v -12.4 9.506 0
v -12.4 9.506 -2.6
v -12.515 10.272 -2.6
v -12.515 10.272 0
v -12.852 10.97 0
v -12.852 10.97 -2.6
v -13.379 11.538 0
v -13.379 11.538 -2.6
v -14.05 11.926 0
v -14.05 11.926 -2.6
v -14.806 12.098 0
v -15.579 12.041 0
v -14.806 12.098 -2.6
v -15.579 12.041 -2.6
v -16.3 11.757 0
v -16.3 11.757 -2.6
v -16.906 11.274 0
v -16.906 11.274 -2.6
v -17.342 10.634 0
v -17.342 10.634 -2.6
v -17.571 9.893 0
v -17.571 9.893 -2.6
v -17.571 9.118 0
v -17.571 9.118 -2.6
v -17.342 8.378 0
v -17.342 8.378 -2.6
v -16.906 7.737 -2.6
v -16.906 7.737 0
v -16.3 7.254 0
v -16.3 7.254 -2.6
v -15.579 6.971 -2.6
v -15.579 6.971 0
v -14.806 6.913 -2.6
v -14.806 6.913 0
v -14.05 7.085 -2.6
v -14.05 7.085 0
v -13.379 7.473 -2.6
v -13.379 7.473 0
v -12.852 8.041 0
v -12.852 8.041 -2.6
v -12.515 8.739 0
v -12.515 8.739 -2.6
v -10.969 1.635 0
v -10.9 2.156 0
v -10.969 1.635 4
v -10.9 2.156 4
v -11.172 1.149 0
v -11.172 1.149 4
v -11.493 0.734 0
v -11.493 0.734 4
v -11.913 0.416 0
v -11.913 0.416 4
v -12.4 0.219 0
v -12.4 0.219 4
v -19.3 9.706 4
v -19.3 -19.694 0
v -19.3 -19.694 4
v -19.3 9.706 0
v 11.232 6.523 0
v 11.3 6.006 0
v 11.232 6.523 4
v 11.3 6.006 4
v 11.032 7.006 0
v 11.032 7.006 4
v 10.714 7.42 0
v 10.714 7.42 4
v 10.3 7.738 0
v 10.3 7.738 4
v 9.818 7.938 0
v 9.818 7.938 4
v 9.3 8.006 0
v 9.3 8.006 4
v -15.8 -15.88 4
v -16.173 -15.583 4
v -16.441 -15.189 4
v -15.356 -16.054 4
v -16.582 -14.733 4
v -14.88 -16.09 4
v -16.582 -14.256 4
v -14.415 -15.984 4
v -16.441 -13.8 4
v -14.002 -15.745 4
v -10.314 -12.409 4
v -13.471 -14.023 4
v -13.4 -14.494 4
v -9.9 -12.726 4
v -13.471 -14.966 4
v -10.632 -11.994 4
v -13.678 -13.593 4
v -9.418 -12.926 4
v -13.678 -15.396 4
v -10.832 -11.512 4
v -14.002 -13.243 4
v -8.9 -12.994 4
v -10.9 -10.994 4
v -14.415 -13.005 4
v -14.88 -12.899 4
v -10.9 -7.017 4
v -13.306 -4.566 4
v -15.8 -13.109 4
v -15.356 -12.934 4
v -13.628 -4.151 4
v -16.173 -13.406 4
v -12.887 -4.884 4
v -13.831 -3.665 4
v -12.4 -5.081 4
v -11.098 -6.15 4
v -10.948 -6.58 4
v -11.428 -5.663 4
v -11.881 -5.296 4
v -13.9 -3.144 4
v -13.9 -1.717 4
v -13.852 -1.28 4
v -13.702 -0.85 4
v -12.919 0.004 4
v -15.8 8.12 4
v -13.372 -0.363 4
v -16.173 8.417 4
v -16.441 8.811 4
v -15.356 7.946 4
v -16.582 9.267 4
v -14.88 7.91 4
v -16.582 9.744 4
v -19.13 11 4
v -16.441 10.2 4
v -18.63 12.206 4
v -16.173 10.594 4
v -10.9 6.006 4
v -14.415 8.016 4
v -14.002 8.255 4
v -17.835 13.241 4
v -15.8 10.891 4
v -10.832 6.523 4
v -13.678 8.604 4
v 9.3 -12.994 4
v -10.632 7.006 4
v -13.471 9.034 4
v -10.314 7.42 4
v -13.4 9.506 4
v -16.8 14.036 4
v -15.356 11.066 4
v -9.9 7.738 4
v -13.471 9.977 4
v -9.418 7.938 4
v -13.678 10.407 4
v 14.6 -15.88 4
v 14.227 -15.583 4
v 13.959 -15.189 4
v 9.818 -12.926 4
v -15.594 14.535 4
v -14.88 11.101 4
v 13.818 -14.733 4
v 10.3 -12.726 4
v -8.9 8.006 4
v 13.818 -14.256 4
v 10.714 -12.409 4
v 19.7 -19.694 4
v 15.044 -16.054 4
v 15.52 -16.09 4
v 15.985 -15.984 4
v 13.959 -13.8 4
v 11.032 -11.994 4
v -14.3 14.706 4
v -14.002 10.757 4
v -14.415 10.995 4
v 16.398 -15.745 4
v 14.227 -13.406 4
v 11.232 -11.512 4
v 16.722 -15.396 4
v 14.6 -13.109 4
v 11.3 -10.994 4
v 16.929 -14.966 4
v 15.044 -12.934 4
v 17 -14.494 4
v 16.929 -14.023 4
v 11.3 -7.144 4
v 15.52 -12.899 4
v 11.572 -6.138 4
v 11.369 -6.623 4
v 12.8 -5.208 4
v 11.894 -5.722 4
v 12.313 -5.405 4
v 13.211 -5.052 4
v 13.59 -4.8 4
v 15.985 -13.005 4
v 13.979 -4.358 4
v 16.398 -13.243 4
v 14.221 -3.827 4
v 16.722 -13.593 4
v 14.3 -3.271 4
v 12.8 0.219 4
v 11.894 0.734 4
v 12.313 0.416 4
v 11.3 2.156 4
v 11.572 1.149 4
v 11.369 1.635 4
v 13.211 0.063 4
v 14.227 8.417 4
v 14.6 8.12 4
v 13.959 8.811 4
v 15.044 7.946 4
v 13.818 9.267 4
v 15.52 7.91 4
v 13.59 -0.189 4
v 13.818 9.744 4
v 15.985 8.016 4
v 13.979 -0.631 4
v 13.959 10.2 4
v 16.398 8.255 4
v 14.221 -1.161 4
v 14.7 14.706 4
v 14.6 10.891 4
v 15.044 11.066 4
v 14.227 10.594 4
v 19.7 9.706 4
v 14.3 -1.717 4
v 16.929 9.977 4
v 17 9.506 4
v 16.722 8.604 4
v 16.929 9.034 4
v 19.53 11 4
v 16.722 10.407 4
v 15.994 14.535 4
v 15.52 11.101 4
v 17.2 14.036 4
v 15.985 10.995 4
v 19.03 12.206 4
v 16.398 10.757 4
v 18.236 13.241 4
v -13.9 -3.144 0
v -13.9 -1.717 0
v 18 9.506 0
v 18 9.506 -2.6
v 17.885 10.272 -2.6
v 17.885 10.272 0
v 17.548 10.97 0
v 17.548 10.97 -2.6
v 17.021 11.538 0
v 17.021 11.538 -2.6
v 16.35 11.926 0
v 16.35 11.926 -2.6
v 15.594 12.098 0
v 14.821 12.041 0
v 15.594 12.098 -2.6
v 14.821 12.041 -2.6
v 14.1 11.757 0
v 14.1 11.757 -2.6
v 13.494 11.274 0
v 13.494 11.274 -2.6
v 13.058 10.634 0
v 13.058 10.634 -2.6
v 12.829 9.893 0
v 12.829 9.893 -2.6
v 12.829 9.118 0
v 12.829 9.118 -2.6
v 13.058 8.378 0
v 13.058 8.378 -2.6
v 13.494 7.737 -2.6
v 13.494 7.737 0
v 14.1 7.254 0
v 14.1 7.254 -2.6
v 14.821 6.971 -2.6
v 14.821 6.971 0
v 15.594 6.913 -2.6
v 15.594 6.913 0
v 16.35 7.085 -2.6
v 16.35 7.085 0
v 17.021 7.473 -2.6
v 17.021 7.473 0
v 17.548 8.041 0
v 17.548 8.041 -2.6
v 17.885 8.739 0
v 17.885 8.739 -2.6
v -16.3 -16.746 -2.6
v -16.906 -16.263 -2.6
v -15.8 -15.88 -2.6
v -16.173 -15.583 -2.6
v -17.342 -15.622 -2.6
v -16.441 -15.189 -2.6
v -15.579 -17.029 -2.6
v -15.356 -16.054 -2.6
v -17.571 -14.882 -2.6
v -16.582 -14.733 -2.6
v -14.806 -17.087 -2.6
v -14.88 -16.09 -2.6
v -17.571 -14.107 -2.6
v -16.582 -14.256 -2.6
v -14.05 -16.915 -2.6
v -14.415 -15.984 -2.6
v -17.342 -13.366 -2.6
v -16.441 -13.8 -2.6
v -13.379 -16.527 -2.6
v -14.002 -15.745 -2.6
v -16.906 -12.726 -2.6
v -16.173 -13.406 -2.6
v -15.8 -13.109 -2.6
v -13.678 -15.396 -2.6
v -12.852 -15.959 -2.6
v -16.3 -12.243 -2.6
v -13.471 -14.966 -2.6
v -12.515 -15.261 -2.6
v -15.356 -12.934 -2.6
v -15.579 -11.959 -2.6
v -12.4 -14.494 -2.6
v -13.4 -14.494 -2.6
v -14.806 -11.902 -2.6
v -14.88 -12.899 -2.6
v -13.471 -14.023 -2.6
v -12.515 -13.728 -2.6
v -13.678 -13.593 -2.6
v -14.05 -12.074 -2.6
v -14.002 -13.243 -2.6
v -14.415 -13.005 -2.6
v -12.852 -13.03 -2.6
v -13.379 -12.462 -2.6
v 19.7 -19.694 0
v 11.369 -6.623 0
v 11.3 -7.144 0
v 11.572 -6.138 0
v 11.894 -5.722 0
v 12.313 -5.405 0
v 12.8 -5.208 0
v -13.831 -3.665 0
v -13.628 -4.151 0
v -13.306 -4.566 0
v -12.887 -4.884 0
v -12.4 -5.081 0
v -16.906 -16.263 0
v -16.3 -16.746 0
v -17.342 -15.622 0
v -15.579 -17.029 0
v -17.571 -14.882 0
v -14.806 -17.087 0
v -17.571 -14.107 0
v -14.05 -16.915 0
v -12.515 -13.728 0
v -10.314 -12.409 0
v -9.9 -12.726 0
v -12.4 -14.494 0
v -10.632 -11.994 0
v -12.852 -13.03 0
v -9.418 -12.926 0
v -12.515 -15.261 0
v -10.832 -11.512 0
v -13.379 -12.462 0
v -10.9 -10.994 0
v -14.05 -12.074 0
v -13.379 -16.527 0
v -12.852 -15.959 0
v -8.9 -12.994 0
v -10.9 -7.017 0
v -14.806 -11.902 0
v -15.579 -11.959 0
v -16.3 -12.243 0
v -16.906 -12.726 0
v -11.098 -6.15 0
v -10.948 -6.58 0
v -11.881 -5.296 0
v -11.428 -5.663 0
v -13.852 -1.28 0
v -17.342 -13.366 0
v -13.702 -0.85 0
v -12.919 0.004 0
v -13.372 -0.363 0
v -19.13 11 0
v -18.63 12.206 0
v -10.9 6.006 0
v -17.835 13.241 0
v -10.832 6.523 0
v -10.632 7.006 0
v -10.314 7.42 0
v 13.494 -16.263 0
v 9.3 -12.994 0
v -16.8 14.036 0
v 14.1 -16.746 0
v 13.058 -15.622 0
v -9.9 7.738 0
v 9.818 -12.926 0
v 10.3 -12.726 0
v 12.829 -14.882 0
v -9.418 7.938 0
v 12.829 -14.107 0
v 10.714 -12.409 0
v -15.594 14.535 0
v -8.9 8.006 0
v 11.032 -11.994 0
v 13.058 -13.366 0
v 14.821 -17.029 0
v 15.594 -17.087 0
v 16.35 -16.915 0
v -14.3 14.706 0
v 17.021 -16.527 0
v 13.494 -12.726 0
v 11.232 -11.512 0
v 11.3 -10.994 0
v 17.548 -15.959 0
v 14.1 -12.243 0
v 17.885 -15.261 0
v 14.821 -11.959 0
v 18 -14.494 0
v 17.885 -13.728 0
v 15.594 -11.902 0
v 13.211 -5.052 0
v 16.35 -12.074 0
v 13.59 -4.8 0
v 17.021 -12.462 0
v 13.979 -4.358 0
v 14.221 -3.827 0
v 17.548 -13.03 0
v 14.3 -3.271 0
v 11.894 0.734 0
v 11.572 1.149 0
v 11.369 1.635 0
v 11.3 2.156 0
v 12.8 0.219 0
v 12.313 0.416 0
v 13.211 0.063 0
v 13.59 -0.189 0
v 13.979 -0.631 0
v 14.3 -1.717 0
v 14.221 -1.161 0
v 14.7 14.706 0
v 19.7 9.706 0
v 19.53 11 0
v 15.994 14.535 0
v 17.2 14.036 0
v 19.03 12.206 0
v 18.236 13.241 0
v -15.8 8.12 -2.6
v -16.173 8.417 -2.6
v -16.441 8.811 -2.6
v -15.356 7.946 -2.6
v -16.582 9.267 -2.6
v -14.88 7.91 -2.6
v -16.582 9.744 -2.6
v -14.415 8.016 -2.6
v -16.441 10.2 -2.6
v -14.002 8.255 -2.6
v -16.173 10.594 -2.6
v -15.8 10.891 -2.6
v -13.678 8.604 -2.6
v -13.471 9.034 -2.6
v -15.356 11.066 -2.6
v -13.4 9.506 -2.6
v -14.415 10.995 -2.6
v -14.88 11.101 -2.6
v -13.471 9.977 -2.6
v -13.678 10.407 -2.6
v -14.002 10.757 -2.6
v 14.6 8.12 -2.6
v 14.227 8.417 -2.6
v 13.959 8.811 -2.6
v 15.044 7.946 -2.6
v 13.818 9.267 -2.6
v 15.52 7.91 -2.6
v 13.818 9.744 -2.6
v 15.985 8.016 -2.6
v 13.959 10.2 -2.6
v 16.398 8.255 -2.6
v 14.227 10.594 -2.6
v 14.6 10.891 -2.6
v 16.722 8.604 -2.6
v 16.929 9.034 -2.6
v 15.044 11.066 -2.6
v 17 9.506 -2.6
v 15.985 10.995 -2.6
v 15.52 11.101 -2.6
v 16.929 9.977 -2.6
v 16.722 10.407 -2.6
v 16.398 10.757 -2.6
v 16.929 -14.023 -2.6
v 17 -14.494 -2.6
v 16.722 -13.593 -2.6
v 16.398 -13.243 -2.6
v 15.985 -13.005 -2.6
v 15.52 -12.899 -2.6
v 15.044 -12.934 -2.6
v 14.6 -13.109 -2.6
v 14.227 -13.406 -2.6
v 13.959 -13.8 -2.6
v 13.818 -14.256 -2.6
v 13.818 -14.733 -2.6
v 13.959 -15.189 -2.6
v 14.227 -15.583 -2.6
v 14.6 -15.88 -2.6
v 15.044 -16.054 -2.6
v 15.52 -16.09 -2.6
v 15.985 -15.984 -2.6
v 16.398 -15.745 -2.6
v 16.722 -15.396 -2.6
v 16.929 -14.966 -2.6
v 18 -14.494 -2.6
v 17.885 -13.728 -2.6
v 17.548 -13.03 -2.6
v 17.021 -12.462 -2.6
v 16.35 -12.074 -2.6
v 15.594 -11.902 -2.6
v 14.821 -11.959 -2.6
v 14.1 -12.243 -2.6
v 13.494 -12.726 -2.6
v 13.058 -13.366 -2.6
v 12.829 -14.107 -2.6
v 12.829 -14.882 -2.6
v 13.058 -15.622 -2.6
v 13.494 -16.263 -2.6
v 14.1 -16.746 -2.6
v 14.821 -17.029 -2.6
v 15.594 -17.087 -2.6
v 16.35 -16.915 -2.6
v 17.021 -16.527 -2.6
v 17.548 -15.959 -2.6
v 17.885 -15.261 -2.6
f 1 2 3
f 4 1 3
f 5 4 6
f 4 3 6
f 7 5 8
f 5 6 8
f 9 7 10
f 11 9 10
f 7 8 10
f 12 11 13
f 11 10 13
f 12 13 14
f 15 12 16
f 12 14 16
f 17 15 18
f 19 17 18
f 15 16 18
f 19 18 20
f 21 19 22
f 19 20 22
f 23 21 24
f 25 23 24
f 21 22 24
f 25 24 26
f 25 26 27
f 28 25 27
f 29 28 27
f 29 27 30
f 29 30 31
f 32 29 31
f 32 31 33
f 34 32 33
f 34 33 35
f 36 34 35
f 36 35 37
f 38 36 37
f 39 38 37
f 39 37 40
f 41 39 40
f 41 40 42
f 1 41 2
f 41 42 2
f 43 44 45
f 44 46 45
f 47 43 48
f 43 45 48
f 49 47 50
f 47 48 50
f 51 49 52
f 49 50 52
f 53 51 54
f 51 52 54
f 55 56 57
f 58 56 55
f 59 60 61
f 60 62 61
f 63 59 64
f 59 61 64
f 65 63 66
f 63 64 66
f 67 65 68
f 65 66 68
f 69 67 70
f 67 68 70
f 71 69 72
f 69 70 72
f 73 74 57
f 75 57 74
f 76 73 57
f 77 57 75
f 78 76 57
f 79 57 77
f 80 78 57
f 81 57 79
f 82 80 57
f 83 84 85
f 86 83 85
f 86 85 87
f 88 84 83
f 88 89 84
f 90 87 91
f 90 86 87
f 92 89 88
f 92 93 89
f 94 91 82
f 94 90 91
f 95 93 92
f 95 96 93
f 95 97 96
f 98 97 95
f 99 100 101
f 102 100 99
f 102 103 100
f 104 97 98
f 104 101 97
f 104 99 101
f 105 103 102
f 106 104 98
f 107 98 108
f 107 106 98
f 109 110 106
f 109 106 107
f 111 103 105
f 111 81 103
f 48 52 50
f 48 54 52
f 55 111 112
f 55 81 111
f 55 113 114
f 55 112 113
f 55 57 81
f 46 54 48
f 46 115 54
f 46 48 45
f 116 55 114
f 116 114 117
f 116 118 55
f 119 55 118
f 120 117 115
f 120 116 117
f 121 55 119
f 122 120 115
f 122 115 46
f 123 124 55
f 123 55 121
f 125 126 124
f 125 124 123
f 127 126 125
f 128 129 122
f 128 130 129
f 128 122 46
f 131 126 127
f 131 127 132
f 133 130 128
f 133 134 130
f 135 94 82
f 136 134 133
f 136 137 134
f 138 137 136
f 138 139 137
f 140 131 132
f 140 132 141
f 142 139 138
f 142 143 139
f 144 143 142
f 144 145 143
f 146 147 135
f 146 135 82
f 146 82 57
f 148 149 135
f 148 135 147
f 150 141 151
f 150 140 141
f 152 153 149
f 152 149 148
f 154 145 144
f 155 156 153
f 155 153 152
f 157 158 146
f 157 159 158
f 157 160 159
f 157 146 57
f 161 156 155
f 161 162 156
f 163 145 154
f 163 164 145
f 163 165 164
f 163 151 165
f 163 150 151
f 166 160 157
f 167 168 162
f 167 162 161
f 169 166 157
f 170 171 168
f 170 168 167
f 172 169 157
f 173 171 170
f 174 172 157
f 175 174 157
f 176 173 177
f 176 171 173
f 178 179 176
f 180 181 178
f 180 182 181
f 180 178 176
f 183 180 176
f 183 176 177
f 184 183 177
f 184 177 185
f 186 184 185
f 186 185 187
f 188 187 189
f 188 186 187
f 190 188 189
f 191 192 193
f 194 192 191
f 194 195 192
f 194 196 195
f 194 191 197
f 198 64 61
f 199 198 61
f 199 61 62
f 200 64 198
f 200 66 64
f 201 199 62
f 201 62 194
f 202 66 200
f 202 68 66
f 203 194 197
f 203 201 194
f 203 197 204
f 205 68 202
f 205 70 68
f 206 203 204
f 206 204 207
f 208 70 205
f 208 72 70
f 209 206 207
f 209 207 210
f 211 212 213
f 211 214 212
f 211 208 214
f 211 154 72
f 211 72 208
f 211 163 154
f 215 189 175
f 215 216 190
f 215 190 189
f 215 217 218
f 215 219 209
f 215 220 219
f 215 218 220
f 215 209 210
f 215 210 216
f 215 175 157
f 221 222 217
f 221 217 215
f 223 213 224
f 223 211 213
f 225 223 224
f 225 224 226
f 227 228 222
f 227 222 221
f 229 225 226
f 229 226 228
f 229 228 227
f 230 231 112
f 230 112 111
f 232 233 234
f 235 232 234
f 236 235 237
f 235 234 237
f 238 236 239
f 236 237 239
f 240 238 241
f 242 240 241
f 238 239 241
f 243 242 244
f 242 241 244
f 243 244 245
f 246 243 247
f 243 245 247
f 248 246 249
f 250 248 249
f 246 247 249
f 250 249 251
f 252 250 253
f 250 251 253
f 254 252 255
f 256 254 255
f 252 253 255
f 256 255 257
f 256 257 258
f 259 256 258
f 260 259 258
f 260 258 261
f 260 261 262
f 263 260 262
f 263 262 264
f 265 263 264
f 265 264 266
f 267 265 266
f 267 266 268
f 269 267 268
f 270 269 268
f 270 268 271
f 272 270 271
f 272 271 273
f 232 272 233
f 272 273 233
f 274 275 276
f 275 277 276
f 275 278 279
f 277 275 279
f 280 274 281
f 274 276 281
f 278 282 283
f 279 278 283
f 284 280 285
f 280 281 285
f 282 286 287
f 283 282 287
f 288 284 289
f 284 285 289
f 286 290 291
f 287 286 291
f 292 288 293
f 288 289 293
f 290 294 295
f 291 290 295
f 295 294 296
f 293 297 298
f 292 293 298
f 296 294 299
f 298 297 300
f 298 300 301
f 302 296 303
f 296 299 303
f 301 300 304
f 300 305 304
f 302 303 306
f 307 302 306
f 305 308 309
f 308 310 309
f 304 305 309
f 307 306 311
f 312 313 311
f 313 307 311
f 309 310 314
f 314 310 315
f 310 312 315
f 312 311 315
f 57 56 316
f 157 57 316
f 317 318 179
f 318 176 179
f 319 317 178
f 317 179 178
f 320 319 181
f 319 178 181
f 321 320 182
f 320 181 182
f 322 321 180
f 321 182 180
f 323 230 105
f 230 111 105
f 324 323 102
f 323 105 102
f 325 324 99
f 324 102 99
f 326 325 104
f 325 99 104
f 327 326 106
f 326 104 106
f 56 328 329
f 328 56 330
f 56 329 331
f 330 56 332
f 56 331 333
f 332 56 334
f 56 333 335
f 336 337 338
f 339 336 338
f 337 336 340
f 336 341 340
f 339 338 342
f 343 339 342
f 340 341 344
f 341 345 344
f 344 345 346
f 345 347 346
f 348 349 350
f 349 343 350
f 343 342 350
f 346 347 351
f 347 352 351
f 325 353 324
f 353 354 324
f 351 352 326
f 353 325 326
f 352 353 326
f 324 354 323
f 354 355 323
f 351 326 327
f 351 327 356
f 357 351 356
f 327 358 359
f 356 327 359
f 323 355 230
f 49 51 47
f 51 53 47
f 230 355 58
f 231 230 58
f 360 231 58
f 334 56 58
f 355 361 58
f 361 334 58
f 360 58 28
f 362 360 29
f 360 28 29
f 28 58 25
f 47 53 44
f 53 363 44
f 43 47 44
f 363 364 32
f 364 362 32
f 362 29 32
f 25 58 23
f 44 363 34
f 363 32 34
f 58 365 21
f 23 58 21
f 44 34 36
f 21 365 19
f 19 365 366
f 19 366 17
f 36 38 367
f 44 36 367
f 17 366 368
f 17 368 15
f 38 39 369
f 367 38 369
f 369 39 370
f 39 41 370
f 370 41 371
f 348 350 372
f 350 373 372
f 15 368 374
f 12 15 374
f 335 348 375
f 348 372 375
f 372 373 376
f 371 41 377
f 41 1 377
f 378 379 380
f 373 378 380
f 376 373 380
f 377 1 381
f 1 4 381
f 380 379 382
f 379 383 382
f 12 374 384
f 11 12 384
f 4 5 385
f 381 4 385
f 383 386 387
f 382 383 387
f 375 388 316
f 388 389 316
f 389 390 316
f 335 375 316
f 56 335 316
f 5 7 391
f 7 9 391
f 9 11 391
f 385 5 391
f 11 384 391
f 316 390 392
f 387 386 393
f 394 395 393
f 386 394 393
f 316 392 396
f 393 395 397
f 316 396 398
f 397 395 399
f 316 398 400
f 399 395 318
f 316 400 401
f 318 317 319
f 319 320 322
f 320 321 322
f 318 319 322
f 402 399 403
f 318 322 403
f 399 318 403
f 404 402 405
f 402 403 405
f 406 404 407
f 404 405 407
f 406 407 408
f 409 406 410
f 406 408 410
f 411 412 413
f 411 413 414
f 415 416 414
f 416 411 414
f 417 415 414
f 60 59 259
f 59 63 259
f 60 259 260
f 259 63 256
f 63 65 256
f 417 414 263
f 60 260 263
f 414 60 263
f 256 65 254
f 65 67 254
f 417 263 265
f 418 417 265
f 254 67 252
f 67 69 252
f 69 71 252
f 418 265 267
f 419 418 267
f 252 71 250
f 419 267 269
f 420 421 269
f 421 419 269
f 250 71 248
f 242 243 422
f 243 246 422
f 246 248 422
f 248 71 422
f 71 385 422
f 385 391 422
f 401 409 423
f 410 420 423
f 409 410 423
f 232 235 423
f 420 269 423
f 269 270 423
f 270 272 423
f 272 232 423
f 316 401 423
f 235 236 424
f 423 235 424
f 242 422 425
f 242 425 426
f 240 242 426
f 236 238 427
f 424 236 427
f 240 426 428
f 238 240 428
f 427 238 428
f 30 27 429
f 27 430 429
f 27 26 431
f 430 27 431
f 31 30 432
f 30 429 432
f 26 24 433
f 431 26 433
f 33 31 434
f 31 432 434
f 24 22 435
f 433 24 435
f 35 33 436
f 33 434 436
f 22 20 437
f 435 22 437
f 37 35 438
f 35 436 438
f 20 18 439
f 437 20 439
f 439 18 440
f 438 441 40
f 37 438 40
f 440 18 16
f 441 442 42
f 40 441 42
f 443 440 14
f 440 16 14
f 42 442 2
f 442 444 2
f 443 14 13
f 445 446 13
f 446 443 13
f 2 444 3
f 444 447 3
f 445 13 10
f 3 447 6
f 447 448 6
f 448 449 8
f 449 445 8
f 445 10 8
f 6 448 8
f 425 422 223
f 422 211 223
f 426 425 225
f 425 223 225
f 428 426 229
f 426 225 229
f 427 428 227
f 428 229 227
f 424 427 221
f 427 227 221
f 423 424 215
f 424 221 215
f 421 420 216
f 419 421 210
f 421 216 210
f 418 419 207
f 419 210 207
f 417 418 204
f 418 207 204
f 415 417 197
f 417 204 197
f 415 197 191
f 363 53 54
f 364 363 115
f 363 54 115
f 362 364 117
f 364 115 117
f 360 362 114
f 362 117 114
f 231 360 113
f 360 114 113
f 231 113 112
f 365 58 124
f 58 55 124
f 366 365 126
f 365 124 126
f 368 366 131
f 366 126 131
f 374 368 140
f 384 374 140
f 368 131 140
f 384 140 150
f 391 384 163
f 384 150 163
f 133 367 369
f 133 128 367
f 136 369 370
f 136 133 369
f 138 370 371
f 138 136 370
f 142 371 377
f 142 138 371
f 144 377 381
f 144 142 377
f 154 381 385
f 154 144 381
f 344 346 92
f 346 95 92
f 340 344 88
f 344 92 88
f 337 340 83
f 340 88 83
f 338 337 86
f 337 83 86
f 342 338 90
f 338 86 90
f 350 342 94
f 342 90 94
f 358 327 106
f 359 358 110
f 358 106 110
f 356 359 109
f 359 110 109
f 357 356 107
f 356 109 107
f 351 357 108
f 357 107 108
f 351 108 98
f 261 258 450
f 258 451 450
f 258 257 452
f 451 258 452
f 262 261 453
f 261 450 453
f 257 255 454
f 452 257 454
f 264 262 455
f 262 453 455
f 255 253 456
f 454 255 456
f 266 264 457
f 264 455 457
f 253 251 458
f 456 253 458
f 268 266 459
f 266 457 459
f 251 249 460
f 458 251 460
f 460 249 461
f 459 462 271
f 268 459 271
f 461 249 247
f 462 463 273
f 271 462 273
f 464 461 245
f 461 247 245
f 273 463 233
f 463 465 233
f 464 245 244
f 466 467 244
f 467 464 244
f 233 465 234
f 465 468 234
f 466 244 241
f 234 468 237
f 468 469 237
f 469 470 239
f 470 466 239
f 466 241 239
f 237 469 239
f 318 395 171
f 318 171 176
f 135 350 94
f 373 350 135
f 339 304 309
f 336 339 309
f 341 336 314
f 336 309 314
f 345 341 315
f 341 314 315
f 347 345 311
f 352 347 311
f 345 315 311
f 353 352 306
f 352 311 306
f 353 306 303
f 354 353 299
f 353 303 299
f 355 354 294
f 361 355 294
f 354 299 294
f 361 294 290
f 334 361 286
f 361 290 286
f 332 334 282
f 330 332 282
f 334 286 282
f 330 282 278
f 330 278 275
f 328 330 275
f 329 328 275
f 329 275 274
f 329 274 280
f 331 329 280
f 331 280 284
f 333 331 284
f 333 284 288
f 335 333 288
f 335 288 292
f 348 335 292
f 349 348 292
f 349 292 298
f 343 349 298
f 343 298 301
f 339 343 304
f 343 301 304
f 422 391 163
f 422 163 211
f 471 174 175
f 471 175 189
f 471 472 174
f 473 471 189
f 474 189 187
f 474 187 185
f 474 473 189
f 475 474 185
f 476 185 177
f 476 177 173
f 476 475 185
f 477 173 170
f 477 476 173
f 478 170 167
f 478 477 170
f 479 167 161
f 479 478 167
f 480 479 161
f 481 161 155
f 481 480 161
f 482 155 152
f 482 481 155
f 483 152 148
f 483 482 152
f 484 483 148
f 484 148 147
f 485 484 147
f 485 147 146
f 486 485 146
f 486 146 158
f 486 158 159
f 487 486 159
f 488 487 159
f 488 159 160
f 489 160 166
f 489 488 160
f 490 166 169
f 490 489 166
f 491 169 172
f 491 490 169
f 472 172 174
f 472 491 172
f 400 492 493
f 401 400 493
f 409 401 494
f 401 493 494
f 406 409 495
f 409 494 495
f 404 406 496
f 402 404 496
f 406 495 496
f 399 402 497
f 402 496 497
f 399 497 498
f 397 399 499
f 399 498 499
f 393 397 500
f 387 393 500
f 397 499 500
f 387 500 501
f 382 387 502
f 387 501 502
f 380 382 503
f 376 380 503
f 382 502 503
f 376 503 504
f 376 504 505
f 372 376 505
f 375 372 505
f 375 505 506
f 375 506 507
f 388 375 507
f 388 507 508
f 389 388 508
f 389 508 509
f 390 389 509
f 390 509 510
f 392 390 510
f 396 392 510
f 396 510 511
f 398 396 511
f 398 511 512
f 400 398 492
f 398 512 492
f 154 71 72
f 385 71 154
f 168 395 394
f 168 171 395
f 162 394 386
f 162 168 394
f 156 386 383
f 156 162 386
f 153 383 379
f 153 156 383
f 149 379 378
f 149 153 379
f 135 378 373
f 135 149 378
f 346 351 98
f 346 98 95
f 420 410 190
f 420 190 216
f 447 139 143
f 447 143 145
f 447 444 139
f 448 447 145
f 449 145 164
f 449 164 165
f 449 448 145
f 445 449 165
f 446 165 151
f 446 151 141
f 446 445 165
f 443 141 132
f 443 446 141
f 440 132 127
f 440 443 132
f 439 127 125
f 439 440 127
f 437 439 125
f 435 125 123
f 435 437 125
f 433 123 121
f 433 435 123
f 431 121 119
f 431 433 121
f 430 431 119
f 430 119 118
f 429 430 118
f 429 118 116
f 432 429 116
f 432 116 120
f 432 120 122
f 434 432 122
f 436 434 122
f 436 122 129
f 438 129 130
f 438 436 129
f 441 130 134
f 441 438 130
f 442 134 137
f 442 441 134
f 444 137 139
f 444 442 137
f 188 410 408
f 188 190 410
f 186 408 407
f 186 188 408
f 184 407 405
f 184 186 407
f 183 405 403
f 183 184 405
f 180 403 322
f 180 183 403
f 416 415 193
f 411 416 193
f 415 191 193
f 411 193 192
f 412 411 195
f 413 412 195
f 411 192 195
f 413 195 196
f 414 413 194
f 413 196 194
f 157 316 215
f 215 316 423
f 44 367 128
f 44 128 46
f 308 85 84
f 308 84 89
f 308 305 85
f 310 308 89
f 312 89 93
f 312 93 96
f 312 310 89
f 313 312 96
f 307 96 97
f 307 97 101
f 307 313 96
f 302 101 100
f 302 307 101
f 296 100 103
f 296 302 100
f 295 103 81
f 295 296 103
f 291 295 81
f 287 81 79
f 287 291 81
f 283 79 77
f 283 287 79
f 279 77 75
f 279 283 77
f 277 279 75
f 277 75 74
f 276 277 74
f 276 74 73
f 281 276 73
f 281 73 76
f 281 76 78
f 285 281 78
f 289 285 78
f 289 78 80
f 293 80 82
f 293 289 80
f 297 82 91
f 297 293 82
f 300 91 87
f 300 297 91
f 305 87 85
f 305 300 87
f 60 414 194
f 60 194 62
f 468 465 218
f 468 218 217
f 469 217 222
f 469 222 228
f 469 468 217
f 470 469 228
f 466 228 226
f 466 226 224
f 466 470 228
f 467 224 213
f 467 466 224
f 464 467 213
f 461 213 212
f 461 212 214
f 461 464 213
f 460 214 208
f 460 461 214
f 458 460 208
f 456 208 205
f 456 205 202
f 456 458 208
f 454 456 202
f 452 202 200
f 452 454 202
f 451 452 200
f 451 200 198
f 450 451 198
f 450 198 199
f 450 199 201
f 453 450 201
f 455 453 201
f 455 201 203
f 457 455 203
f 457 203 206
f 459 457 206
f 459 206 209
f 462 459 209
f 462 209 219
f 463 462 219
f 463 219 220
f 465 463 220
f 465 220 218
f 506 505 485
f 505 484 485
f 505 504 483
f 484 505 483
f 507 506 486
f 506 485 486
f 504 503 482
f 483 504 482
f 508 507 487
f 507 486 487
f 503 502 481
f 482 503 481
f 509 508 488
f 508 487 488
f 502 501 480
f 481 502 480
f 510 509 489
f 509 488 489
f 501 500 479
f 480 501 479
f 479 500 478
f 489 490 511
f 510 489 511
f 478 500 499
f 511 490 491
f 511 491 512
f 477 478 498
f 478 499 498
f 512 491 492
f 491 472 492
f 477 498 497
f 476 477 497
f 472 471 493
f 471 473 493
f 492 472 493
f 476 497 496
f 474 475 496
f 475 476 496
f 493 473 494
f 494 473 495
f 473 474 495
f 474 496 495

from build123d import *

# Parameters (mm, degrees)
SKETCH1_W           = 39
SKETCH1_H           = 34.4
SKETCH1_R           = 1.6
BOSS_EXTRUDE5_DEPTH = 4
FILLET1_R           = 5
BOSS_EXTRUDE6_START = -2.6
SKETCH4_R           = 2.6
SKETCH4_R_2         = 1.6
BOSS_EXTRUDE6_DEPTH = 2.6
FILLET4_R           = 2
FILLET5_R           = 2
FILLET6_R           = 2
FILLET8_R           = 2
FILLET9_R           = 2
FILLET10_R          = 2
FILLET11_R          = 2
FILLET12_R          = 2
FILLET13_R          = 2
FILLET14_R          = 2
FILLET15_R          = 2
FILLET16_R          = 2


with BuildPart() as part:
    # Sketch1 → Boss-Extrude5 (new body)
    with BuildSketch(Plane.XY):
        with Locations((0.200050248, -2.49430892)):
            Rectangle(SKETCH1_W, SKETCH1_H)
        with Locations((-14.999949752, 9.50569108)):
            Circle(SKETCH1_R, mode=Mode.SUBTRACT)
        with Locations((15.400050248, 9.50569108)):
            Circle(SKETCH1_R, mode=Mode.SUBTRACT)
        with Locations((-14.999949752, -14.49430892)):
            Circle(SKETCH1_R, mode=Mode.SUBTRACT)
        with Locations((15.400050248, -14.49430892)):
            Circle(SKETCH1_R, mode=Mode.SUBTRACT)
        Polygon((14.300050248, 0.15569108), (11.300050248, 0.15569108), (11.300050248, 8.00569108), (-10.899949752, 8.00569108), (-10.899949752, 0.15569108), (-13.899949752, 0.15569108), (-13.899949752, -5.14430892), (-10.899949752, -5.14430892), (-10.899949752, -12.99430892), (11.300050248, -12.99430892), (11.300050248, -5.14430892), (14.300050248, -5.14430892), align=None, mode=Mode.SUBTRACT)
    extrude(amount=BOSS_EXTRUDE5_DEPTH)

    # Fillet1
    fillet1_edges = [part.edges().sort_by_distance(p)[0] for p in [
        (-19.299949752, 14.70569108, 2),
        (19.700050248, 14.70569108, 2),
    ]]
    fillet(fillet1_edges, radius=FILLET1_R)

    # Sketch4 → Boss-Extrude6 (add)
    # profile 1 of 4: a face of its own
    with BuildSketch(Plane.XY.offset(BOSS_EXTRUDE6_START)):
        with Locations((15.400050248, 9.50569108)):
            Circle(SKETCH4_R)
        with Locations((15.400050248, 9.50569108)):
            Circle(SKETCH4_R_2, mode=Mode.SUBTRACT)
    # profile 2 of 4: a face of its own
    with BuildSketch(Plane.XY.offset(BOSS_EXTRUDE6_START)):
        with Locations((-14.999949752, 9.50569108)):
            Circle(SKETCH4_R)
        with Locations((-14.999949752, 9.50569108)):
            Circle(SKETCH4_R_2, mode=Mode.SUBTRACT)
    # profile 3 of 4: a face of its own
    with BuildSketch(Plane.XY.offset(BOSS_EXTRUDE6_START)):
        with Locations((15.400050248, -14.49430892)):
            Circle(SKETCH4_R)
        with Locations((15.400050248, -14.49430892)):
            Circle(SKETCH4_R_2, mode=Mode.SUBTRACT)
    # profile 4 of 4: a face of its own
    with BuildSketch(Plane.XY.offset(BOSS_EXTRUDE6_START)):
        with Locations((-14.999949752, -14.49430892)):
            Circle(SKETCH4_R)
        with Locations((-14.999949752, -14.49430892)):
            Circle(SKETCH4_R_2, mode=Mode.SUBTRACT)
    extrude(amount=BOSS_EXTRUDE6_DEPTH)

    # Fillet4
    fillet4_edges = [part.edges().sort_by_distance(p)[0] for p in [
        (-10.899949752, 8.00569108, 2),
    ]]
    fillet(fillet4_edges, radius=FILLET4_R)

    # Fillet5
    fillet5_edges = [part.edges().sort_by_distance(p)[0] for p in [
        (-10.899949752, 0.15569108, 2),
    ]]
    fillet(fillet5_edges, radius=FILLET5_R)

    # Fillet6
    fillet6_edges = [part.edges().sort_by_distance(p)[0] for p in [
        (-13.899949752, 0.15569108, 2),
    ]]
    fillet(fillet6_edges, radius=FILLET6_R)

    # Fillet8
    fillet8_edges = [part.edges().sort_by_distance(p)[0] for p in [
        (-13.899949752, -5.14430892, 2),
    ]]
    fillet(fillet8_edges, radius=FILLET8_R)

    # Fillet9
    fillet9_edges = [part.edges().sort_by_distance(p)[0] for p in [
        (-10.899949752, -5.14430892, 2),
    ]]
    fillet(fillet9_edges, radius=FILLET9_R)

    # Fillet10
    fillet10_edges = [part.edges().sort_by_distance(p)[0] for p in [
        (-10.899949752, -12.99430892, 2),
    ]]
    fillet(fillet10_edges, radius=FILLET10_R)

    # Fillet11
    fillet11_edges = [part.edges().sort_by_distance(p)[0] for p in [
        (11.300050248, -5.14430892, 2),
    ]]
    fillet(fillet11_edges, radius=FILLET11_R)

    # Fillet12
    fillet12_edges = [part.edges().sort_by_distance(p)[0] for p in [
        (11.300050248, 0.15569108, 2),
    ]]
    fillet(fillet12_edges, radius=FILLET12_R)

    # Fillet13
    fillet13_edges = [part.edges().sort_by_distance(p)[0] for p in [
        (11.300050248, -12.99430892, 2),
    ]]
    fillet(fillet13_edges, radius=FILLET13_R)

    # Fillet14
    fillet14_edges = [part.edges().sort_by_distance(p)[0] for p in [
        (14.300050248, 0.15569108, 2),
    ]]
    fillet(fillet14_edges, radius=FILLET14_R)

    # Fillet15
    fillet15_edges = [part.edges().sort_by_distance(p)[0] for p in [
        (11.300050248, 8.00569108, 2),
    ]]
    fillet(fillet15_edges, radius=FILLET15_R)

    # Fillet16
    fillet16_edges = [part.edges().sort_by_distance(p)[0] for p in [
        (14.300050248, -5.14430892, 2),
    ]]
    fillet(fillet16_edges, radius=FILLET16_R)


solid = part.part
